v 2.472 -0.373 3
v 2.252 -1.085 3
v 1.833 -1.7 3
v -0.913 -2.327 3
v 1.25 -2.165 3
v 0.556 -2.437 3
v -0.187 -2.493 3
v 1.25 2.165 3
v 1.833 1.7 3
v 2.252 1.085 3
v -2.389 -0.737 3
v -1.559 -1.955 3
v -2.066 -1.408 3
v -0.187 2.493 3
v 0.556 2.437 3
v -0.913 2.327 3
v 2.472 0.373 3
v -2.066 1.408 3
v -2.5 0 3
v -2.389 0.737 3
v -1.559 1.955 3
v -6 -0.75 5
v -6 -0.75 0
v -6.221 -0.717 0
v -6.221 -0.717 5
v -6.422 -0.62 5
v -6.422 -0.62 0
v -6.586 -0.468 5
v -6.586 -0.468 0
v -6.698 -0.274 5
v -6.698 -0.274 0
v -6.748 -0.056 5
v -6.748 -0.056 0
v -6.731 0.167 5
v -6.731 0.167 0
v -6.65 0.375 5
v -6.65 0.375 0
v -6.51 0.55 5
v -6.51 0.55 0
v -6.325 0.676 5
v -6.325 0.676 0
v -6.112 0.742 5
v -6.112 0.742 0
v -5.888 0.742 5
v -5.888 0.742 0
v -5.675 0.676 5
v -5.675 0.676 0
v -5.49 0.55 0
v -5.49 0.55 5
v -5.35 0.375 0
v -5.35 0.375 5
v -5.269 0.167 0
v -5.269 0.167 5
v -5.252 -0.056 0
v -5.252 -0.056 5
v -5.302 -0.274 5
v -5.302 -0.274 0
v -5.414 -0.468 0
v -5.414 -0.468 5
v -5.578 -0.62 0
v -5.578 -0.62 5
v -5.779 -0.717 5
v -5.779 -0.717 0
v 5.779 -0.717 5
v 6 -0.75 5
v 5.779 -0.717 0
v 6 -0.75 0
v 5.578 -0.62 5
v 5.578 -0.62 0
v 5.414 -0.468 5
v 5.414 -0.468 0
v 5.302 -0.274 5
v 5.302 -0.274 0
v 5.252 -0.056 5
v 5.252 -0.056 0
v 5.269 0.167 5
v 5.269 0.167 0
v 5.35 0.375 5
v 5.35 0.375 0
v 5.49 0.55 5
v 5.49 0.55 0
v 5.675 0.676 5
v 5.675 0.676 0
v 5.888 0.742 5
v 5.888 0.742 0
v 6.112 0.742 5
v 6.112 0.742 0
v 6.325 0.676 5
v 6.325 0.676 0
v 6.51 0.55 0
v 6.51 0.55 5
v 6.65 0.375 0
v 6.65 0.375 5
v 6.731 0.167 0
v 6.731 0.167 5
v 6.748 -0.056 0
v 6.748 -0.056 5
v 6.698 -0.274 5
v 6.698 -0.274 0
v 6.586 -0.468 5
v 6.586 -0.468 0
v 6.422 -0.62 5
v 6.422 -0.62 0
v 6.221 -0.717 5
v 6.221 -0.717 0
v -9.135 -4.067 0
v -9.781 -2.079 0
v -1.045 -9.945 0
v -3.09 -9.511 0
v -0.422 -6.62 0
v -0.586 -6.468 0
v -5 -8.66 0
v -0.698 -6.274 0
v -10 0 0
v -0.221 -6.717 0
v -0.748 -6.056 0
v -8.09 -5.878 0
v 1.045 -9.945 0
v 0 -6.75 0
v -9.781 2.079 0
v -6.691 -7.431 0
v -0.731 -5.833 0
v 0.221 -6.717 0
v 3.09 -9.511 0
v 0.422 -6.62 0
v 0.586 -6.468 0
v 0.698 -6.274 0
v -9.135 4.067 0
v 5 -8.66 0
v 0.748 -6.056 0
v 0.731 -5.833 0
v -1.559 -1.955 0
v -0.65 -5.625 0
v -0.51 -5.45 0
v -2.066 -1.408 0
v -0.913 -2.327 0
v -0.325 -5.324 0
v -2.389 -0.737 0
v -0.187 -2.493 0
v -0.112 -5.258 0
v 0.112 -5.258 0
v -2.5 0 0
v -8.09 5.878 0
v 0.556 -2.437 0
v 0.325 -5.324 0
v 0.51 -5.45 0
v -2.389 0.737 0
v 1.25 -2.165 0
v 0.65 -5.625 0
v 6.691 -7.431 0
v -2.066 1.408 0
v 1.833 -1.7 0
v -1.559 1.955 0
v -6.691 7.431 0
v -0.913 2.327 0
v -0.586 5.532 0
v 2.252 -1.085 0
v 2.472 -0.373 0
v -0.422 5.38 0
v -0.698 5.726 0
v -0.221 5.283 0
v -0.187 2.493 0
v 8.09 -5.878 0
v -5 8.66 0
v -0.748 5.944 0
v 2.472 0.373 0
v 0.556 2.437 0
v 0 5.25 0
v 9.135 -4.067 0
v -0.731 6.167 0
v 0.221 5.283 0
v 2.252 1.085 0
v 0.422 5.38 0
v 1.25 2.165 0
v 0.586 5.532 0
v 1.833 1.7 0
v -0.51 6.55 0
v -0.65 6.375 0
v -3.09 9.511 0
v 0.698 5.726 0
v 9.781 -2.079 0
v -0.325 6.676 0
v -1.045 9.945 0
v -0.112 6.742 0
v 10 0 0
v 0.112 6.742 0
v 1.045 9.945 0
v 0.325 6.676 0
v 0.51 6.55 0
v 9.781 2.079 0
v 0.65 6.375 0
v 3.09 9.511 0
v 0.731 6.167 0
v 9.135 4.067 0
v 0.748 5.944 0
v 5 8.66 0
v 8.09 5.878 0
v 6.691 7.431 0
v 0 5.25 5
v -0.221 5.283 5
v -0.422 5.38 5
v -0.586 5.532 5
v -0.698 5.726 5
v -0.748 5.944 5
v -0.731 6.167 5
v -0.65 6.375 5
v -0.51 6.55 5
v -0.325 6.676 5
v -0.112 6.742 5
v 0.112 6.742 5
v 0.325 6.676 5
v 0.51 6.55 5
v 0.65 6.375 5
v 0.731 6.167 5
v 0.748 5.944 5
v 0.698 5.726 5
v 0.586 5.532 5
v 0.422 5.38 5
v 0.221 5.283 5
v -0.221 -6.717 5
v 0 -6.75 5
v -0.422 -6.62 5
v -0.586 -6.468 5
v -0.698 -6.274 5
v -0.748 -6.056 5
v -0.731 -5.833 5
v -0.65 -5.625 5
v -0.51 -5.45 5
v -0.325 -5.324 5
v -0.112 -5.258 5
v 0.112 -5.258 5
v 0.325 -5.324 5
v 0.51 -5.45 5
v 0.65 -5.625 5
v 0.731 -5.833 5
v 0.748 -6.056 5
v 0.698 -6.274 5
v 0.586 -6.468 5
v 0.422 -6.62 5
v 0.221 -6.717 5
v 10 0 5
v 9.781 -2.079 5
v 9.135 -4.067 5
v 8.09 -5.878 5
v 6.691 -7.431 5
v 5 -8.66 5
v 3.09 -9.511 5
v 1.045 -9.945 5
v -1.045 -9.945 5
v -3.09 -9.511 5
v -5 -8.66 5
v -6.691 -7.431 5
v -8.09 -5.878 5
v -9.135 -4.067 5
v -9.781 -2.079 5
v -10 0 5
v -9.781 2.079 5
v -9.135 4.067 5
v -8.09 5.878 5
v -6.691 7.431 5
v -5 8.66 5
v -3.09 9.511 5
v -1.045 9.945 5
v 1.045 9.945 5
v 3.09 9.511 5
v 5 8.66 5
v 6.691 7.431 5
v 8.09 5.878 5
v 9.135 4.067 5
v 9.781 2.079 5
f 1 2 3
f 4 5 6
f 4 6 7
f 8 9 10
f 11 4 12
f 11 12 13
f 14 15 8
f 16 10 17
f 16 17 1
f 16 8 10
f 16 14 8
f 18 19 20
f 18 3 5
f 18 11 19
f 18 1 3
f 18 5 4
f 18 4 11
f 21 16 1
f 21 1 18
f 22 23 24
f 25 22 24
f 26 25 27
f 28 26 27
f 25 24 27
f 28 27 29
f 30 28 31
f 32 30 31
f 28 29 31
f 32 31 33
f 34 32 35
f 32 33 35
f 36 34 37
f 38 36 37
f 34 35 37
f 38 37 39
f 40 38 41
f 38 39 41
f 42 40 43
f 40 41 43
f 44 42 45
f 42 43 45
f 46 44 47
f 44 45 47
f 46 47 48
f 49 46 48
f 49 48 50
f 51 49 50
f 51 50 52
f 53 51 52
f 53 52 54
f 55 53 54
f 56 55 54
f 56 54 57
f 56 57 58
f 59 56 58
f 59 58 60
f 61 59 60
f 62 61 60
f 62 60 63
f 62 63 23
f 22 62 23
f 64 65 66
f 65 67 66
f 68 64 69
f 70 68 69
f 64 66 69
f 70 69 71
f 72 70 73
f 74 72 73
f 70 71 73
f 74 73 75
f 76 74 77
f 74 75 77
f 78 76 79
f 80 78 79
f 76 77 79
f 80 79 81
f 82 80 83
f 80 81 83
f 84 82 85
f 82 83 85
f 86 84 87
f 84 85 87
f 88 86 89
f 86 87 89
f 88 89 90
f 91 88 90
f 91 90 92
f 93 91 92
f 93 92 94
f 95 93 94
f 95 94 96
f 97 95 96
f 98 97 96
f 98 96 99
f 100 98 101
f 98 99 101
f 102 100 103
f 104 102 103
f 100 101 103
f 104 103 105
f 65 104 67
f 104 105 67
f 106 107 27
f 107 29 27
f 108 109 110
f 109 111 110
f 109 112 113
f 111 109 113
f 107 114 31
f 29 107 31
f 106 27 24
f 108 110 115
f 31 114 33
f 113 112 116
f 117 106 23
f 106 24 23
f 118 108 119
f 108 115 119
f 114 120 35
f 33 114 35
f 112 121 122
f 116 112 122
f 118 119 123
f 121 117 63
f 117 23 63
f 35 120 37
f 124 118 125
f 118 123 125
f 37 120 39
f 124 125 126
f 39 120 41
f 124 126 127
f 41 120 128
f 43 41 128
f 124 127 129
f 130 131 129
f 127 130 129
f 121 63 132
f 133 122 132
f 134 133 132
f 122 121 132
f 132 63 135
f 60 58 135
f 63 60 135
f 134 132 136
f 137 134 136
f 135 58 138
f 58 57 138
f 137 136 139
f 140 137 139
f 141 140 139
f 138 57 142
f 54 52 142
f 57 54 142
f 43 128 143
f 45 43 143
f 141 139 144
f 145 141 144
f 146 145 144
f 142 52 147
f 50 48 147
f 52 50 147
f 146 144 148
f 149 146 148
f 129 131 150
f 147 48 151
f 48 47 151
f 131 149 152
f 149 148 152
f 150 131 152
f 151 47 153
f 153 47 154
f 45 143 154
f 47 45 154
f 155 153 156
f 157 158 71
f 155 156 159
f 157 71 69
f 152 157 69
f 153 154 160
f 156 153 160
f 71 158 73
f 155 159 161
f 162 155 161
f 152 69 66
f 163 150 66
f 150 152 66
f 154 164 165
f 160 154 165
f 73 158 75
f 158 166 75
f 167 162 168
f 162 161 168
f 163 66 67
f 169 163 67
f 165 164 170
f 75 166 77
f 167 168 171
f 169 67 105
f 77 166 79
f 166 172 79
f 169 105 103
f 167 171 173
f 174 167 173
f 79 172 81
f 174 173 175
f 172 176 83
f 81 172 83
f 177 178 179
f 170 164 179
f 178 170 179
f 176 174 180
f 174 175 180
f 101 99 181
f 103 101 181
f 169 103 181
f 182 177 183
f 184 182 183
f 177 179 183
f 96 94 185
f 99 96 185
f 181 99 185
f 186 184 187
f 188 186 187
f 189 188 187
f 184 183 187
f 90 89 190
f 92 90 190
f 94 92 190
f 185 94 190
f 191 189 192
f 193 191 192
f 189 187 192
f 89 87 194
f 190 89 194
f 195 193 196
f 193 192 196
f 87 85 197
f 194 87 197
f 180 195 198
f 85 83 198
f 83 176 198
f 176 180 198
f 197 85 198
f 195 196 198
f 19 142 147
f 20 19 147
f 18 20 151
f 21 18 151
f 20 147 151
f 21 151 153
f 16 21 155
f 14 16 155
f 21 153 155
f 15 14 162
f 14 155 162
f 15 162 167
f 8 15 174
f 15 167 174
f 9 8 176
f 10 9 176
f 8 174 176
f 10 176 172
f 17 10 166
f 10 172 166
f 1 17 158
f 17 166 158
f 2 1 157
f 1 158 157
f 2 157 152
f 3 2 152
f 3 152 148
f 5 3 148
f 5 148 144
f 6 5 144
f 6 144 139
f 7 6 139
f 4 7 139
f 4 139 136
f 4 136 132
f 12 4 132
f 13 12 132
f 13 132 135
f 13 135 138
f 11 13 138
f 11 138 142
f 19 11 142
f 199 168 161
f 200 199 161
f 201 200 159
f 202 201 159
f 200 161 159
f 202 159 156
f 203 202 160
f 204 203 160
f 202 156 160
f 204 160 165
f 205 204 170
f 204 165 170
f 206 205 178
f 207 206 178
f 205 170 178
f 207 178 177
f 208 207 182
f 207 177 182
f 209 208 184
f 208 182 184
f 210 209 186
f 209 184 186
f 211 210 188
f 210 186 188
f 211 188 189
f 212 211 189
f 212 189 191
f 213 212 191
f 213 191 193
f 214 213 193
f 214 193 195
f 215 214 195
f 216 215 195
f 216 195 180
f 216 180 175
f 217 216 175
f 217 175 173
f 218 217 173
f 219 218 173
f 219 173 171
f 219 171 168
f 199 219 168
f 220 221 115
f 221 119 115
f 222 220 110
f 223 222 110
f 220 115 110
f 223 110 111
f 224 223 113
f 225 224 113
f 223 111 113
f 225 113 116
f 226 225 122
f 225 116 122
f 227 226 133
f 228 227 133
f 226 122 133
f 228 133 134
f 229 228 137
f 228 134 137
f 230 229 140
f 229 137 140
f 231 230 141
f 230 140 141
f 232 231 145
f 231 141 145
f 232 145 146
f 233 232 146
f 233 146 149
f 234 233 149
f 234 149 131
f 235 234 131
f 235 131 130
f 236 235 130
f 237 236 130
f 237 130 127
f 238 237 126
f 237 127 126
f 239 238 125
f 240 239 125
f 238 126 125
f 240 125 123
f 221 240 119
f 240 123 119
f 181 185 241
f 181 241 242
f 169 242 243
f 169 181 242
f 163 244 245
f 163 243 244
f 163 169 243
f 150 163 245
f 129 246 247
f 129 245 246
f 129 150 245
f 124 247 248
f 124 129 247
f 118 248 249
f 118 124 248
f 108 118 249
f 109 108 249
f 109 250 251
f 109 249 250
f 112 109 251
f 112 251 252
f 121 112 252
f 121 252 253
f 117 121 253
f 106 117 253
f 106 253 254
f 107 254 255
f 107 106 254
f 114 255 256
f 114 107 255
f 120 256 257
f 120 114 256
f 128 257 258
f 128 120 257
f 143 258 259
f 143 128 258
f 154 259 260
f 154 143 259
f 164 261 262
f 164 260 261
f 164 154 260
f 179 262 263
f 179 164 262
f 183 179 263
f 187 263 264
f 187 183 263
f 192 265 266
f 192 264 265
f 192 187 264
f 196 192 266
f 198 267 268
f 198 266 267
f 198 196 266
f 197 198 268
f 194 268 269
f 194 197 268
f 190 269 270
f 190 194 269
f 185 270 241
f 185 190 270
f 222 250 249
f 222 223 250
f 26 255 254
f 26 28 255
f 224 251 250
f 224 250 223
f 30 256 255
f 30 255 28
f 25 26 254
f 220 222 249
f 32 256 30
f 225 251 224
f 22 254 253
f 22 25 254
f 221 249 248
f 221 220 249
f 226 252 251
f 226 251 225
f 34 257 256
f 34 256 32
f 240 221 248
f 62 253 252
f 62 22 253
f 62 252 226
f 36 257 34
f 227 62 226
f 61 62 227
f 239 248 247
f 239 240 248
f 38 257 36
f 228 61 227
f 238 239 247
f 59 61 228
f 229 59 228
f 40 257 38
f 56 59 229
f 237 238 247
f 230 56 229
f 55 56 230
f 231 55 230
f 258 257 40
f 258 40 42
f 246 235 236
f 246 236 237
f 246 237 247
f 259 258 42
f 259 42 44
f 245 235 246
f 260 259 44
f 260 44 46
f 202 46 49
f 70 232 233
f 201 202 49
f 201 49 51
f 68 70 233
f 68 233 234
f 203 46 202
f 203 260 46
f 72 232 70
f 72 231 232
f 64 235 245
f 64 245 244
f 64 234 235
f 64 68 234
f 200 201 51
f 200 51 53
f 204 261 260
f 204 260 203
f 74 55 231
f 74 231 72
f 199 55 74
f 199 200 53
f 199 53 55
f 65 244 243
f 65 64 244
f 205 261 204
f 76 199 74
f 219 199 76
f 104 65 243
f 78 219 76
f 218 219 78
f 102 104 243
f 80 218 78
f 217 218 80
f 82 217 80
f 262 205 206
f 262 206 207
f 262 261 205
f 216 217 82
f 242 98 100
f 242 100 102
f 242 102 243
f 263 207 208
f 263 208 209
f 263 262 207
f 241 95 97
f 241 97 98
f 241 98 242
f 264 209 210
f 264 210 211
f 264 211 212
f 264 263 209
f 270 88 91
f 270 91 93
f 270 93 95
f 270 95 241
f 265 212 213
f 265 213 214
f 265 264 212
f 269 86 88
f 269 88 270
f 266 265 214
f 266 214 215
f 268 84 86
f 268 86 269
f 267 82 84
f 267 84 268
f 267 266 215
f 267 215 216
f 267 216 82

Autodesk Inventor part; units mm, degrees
ref_plane "YZ Plane" through (0, 0, 0) normal (1, 0, 0) x (0, 1, 0)
ref_plane "XZ Plane" through (0, 0, 0) normal (0, 1, 0) x (-1, 0, 0)
ref_plane "XY Plane" through (0, 0, 0) normal (0, 0, 1) x (1, 0, 0)
sketch "スケッチ1" plane through (0, 0, 0) normal (0, 0, 1) x (1, 0, 0)
  circle A0 centre (0, 0) radius 10
  dimension "d0" = 20
extrude "押し出し1" add sketch "スケッチ1" along normal blind 5
sketch "スケッチ2" plane through (0, 0, 5) normal (0, 0, 1) x (1, 0, 0)
  circle A0 centre (0, 0) radius 6
  line L0 (-6, 6) -> (6, 6)
  line L1 (6, 6) -> (6, -6)
  line L2 (6, -6) -> (-6, -6)
  line L3 (-6, -6) -> (-6, 6)
  point P0 (0, 6)
  point P1 (-6, 0)
  point P2 (0, -6)
  point P3 (6, 0)
  dimension "d3" = 12
  dimension "d6" = 360
  dimension "d8" = 6
hole "穴1" at (0, 6, 5) at (-6, 0, 5) at (0, -6, 5) at (6, 0, 5) direction (0, 0, -1) diameter 1.5 end through all
sketch "スケッチ3" plane through (0, 0, 0) normal (0, 0, -1) x (-1, 0, 0)
  circle A0 centre (0, 0) radius 2.5
  dimension "d16" = 5
extrude "押し出し2" cut sketch "スケッチ3" against normal blind 3
properties part number "servo_horn"
